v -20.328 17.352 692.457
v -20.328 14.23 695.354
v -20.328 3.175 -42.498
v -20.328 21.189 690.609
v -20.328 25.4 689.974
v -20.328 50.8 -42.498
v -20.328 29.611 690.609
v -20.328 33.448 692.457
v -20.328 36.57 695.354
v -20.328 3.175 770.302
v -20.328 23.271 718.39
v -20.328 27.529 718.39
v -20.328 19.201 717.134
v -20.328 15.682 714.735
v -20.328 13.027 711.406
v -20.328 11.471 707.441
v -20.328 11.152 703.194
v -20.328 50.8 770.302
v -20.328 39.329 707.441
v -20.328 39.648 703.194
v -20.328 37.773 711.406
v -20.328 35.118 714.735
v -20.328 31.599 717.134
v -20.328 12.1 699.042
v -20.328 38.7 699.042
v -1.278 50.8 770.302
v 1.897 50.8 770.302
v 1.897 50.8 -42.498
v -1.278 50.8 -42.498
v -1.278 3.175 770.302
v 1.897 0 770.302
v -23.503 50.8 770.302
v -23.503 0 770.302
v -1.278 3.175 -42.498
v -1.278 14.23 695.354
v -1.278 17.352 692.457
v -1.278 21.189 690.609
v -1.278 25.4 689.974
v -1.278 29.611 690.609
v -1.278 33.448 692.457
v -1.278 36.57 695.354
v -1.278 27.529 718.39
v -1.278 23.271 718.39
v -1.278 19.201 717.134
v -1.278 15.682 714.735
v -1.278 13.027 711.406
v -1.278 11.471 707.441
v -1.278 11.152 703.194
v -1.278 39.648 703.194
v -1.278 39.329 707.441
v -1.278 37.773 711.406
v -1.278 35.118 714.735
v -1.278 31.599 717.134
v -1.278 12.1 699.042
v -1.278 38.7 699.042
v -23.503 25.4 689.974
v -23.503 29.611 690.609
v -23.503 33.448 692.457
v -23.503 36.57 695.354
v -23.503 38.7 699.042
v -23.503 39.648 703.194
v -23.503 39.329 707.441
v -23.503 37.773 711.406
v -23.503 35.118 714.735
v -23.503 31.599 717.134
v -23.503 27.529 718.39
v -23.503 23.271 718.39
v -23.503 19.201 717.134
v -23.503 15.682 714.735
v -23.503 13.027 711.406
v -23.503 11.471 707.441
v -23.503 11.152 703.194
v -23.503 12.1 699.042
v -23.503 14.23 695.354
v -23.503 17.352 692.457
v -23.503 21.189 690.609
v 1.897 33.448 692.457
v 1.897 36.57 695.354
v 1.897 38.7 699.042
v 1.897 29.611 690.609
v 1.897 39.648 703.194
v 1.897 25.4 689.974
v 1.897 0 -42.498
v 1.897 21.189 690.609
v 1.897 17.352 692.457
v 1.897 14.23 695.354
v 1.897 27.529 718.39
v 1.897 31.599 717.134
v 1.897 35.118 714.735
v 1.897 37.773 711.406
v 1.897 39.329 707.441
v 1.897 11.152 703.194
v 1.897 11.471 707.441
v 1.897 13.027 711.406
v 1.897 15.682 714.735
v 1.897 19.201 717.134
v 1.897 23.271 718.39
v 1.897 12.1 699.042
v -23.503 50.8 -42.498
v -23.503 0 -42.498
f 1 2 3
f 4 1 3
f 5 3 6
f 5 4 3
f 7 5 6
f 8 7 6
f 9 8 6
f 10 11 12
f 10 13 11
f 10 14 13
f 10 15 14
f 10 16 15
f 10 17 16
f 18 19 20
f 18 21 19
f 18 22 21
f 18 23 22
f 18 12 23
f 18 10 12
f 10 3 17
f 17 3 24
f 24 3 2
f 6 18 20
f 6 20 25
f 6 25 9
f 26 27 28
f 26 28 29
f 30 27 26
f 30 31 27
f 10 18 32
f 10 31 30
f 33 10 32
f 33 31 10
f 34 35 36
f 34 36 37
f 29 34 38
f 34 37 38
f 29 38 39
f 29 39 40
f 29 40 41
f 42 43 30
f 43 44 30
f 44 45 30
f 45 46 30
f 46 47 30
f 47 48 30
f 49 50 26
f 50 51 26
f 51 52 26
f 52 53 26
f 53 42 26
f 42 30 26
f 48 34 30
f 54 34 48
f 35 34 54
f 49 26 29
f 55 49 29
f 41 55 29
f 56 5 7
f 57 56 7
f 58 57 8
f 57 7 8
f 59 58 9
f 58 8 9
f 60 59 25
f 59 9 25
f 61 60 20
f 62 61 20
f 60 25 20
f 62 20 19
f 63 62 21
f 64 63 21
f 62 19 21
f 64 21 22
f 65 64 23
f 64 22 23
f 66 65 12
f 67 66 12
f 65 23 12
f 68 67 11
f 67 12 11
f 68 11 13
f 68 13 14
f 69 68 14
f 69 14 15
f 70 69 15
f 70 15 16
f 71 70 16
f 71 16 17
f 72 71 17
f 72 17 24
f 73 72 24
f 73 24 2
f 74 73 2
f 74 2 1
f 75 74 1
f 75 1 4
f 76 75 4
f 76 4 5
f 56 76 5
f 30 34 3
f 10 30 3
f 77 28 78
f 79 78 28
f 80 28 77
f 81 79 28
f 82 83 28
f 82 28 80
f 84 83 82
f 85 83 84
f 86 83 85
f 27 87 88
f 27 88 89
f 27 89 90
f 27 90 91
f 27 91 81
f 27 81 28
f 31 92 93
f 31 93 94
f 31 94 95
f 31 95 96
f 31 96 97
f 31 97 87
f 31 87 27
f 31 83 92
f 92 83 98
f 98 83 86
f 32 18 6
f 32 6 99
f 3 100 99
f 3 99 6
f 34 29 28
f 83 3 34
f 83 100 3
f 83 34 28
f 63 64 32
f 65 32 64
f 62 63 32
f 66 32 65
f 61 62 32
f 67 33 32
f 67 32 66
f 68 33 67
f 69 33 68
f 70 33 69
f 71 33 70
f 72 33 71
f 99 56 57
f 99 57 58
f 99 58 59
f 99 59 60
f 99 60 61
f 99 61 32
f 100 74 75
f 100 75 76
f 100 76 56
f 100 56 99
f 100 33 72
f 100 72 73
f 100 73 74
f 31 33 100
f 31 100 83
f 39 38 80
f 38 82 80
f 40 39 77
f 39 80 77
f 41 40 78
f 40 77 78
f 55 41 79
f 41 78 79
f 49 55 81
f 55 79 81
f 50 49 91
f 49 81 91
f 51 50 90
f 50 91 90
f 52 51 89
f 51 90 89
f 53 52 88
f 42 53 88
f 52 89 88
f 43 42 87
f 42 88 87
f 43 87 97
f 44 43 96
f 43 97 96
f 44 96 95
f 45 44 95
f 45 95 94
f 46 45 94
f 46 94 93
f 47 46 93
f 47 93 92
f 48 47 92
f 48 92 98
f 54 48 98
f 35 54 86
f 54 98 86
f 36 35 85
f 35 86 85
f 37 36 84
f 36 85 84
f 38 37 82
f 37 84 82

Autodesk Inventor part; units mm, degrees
ref_plane "YZ Plane" through (0, 0, 0) normal (1, 0, 0) x (0, 1, 0)
ref_plane "XZ Plane" through (0, 0, 0) normal (0, 1, 0) x (-1, 0, 0)
ref_plane "XY Plane" through (0, 0, 0) normal (0, 0, 1) x (1, 0, 0)
sketch "Sketch1" plane through (0, 0, 0) normal (0, 1, 0) x (-1, 0, 0)
  line L0 (23.5034, -42.4981) -> (-1.8966, -42.4981)
  line L1 (-1.8966, -42.4981) -> (-1.8966, 770.3019)
  line L2 (-1.8966, 770.3019) -> (23.5034, 770.3019)
  line L3 (23.5034, 770.3019) -> (23.5034, -42.4981)
  line L4 (20.3284, -39.3231) -> (1.2784, -39.3231)
  line L5 (1.2784, -39.3231) -> (1.2784, 767.1269)
  line L6 (1.2784, 767.1269) -> (20.3284, 767.1269)
  line L7 (20.3284, 767.1269) -> (20.3284, -39.3231)
  point P0 (0, 0)
  dimension "d0" = 25.4
  dimension "d1" = 812.8
  dimension "d2" = 3.175
ref_plane "Work Plane3" through (0, 0, 0) normal (0, -1, 0) x (1, 0, 0)
sketch "Sketch2" plane through (0, 0, 0) normal (0, -1, 0) x (1, 0, 0)
  line L0 (-1.2784, -39.3231) -> (-20.3284, -39.3231) projected
  line L1 (-20.3284, -39.3231) -> (-20.3284, 767.1269) projected
  line L2 (-1.2784, -39.3231) -> (-20.3284, -39.3231)
  line L3 (-20.3284, -39.3231) -> (-20.3284, 767.1269)
  line L4 (-20.3284, 767.1269) -> (-1.2784, 767.1269)
  line L5 (-1.2784, 767.1269) -> (-1.2784, -39.3231)
  point P0 (0, 0)
extrude "Extrusion3" add sketch "Sketch2" against normal blind 3.175
extrude "Extrusion5" add sketch "Sketch1" along normal blind 50.8
sketch "Sketch4" plane through (-23.5034, 0, 770.3019) normal (0, 0, 1) x (1, 0, 0)
  line L0 (0, 50.8) -> (25.4, 50.8) projected
  line L1 (0, 50.8) -> (3.175, 50.8)
  line L2 (3.175, 50.8) -> (25.4, 50.8)
  line L3 (25.4, 50.8) -> (22.225, 50.8)
  line L4 (22.225, 3.175) -> (22.225, 50.8) projected
  line L5 (3.175, 50.8) -> (22.225, 50.8)
  line L6 (22.225, 50.8) -> (22.225, 3.175)
  line L7 (22.225, 3.175) -> (3.175, 3.175)
  line L8 (3.175, 3.175) -> (3.175, 50.8)
  point P0 (23.5034, 0)
  point P1 (22.225, 0)
  dimension "d13" = 3.175
  dimension "d14" = 3.175
extrude "Extrusion6" cut sketch "Sketch4" against normal blind 1016
sketch "Sketch5" plane through (1.8966, 0, 770.3019) normal (1, 0, 0) x (0, 0, -1)
  line L0 (0, 0) -> (66.04, 0)
  line L1 (66.04, 0) -> (66.04, 25.4)
  line L2 (66.04, 25.4) -> (0, 25.4)
  line L3 (0, 25.4) -> (0, 0)
  circle A0 centre (66.04, 25.4) radius 14.2875
  point P0 (770.3019, 0)
  dimension "d17" = 66.04
  dimension "d18" = 25.4
  dimension "d19" = 28.575
extrude "Extrusion7" cut sketch "Sketch5" against normal blind 1016 contours A0 L2 L1 | L1 L2 A0
properties part number "36in Aluminum Channel"
